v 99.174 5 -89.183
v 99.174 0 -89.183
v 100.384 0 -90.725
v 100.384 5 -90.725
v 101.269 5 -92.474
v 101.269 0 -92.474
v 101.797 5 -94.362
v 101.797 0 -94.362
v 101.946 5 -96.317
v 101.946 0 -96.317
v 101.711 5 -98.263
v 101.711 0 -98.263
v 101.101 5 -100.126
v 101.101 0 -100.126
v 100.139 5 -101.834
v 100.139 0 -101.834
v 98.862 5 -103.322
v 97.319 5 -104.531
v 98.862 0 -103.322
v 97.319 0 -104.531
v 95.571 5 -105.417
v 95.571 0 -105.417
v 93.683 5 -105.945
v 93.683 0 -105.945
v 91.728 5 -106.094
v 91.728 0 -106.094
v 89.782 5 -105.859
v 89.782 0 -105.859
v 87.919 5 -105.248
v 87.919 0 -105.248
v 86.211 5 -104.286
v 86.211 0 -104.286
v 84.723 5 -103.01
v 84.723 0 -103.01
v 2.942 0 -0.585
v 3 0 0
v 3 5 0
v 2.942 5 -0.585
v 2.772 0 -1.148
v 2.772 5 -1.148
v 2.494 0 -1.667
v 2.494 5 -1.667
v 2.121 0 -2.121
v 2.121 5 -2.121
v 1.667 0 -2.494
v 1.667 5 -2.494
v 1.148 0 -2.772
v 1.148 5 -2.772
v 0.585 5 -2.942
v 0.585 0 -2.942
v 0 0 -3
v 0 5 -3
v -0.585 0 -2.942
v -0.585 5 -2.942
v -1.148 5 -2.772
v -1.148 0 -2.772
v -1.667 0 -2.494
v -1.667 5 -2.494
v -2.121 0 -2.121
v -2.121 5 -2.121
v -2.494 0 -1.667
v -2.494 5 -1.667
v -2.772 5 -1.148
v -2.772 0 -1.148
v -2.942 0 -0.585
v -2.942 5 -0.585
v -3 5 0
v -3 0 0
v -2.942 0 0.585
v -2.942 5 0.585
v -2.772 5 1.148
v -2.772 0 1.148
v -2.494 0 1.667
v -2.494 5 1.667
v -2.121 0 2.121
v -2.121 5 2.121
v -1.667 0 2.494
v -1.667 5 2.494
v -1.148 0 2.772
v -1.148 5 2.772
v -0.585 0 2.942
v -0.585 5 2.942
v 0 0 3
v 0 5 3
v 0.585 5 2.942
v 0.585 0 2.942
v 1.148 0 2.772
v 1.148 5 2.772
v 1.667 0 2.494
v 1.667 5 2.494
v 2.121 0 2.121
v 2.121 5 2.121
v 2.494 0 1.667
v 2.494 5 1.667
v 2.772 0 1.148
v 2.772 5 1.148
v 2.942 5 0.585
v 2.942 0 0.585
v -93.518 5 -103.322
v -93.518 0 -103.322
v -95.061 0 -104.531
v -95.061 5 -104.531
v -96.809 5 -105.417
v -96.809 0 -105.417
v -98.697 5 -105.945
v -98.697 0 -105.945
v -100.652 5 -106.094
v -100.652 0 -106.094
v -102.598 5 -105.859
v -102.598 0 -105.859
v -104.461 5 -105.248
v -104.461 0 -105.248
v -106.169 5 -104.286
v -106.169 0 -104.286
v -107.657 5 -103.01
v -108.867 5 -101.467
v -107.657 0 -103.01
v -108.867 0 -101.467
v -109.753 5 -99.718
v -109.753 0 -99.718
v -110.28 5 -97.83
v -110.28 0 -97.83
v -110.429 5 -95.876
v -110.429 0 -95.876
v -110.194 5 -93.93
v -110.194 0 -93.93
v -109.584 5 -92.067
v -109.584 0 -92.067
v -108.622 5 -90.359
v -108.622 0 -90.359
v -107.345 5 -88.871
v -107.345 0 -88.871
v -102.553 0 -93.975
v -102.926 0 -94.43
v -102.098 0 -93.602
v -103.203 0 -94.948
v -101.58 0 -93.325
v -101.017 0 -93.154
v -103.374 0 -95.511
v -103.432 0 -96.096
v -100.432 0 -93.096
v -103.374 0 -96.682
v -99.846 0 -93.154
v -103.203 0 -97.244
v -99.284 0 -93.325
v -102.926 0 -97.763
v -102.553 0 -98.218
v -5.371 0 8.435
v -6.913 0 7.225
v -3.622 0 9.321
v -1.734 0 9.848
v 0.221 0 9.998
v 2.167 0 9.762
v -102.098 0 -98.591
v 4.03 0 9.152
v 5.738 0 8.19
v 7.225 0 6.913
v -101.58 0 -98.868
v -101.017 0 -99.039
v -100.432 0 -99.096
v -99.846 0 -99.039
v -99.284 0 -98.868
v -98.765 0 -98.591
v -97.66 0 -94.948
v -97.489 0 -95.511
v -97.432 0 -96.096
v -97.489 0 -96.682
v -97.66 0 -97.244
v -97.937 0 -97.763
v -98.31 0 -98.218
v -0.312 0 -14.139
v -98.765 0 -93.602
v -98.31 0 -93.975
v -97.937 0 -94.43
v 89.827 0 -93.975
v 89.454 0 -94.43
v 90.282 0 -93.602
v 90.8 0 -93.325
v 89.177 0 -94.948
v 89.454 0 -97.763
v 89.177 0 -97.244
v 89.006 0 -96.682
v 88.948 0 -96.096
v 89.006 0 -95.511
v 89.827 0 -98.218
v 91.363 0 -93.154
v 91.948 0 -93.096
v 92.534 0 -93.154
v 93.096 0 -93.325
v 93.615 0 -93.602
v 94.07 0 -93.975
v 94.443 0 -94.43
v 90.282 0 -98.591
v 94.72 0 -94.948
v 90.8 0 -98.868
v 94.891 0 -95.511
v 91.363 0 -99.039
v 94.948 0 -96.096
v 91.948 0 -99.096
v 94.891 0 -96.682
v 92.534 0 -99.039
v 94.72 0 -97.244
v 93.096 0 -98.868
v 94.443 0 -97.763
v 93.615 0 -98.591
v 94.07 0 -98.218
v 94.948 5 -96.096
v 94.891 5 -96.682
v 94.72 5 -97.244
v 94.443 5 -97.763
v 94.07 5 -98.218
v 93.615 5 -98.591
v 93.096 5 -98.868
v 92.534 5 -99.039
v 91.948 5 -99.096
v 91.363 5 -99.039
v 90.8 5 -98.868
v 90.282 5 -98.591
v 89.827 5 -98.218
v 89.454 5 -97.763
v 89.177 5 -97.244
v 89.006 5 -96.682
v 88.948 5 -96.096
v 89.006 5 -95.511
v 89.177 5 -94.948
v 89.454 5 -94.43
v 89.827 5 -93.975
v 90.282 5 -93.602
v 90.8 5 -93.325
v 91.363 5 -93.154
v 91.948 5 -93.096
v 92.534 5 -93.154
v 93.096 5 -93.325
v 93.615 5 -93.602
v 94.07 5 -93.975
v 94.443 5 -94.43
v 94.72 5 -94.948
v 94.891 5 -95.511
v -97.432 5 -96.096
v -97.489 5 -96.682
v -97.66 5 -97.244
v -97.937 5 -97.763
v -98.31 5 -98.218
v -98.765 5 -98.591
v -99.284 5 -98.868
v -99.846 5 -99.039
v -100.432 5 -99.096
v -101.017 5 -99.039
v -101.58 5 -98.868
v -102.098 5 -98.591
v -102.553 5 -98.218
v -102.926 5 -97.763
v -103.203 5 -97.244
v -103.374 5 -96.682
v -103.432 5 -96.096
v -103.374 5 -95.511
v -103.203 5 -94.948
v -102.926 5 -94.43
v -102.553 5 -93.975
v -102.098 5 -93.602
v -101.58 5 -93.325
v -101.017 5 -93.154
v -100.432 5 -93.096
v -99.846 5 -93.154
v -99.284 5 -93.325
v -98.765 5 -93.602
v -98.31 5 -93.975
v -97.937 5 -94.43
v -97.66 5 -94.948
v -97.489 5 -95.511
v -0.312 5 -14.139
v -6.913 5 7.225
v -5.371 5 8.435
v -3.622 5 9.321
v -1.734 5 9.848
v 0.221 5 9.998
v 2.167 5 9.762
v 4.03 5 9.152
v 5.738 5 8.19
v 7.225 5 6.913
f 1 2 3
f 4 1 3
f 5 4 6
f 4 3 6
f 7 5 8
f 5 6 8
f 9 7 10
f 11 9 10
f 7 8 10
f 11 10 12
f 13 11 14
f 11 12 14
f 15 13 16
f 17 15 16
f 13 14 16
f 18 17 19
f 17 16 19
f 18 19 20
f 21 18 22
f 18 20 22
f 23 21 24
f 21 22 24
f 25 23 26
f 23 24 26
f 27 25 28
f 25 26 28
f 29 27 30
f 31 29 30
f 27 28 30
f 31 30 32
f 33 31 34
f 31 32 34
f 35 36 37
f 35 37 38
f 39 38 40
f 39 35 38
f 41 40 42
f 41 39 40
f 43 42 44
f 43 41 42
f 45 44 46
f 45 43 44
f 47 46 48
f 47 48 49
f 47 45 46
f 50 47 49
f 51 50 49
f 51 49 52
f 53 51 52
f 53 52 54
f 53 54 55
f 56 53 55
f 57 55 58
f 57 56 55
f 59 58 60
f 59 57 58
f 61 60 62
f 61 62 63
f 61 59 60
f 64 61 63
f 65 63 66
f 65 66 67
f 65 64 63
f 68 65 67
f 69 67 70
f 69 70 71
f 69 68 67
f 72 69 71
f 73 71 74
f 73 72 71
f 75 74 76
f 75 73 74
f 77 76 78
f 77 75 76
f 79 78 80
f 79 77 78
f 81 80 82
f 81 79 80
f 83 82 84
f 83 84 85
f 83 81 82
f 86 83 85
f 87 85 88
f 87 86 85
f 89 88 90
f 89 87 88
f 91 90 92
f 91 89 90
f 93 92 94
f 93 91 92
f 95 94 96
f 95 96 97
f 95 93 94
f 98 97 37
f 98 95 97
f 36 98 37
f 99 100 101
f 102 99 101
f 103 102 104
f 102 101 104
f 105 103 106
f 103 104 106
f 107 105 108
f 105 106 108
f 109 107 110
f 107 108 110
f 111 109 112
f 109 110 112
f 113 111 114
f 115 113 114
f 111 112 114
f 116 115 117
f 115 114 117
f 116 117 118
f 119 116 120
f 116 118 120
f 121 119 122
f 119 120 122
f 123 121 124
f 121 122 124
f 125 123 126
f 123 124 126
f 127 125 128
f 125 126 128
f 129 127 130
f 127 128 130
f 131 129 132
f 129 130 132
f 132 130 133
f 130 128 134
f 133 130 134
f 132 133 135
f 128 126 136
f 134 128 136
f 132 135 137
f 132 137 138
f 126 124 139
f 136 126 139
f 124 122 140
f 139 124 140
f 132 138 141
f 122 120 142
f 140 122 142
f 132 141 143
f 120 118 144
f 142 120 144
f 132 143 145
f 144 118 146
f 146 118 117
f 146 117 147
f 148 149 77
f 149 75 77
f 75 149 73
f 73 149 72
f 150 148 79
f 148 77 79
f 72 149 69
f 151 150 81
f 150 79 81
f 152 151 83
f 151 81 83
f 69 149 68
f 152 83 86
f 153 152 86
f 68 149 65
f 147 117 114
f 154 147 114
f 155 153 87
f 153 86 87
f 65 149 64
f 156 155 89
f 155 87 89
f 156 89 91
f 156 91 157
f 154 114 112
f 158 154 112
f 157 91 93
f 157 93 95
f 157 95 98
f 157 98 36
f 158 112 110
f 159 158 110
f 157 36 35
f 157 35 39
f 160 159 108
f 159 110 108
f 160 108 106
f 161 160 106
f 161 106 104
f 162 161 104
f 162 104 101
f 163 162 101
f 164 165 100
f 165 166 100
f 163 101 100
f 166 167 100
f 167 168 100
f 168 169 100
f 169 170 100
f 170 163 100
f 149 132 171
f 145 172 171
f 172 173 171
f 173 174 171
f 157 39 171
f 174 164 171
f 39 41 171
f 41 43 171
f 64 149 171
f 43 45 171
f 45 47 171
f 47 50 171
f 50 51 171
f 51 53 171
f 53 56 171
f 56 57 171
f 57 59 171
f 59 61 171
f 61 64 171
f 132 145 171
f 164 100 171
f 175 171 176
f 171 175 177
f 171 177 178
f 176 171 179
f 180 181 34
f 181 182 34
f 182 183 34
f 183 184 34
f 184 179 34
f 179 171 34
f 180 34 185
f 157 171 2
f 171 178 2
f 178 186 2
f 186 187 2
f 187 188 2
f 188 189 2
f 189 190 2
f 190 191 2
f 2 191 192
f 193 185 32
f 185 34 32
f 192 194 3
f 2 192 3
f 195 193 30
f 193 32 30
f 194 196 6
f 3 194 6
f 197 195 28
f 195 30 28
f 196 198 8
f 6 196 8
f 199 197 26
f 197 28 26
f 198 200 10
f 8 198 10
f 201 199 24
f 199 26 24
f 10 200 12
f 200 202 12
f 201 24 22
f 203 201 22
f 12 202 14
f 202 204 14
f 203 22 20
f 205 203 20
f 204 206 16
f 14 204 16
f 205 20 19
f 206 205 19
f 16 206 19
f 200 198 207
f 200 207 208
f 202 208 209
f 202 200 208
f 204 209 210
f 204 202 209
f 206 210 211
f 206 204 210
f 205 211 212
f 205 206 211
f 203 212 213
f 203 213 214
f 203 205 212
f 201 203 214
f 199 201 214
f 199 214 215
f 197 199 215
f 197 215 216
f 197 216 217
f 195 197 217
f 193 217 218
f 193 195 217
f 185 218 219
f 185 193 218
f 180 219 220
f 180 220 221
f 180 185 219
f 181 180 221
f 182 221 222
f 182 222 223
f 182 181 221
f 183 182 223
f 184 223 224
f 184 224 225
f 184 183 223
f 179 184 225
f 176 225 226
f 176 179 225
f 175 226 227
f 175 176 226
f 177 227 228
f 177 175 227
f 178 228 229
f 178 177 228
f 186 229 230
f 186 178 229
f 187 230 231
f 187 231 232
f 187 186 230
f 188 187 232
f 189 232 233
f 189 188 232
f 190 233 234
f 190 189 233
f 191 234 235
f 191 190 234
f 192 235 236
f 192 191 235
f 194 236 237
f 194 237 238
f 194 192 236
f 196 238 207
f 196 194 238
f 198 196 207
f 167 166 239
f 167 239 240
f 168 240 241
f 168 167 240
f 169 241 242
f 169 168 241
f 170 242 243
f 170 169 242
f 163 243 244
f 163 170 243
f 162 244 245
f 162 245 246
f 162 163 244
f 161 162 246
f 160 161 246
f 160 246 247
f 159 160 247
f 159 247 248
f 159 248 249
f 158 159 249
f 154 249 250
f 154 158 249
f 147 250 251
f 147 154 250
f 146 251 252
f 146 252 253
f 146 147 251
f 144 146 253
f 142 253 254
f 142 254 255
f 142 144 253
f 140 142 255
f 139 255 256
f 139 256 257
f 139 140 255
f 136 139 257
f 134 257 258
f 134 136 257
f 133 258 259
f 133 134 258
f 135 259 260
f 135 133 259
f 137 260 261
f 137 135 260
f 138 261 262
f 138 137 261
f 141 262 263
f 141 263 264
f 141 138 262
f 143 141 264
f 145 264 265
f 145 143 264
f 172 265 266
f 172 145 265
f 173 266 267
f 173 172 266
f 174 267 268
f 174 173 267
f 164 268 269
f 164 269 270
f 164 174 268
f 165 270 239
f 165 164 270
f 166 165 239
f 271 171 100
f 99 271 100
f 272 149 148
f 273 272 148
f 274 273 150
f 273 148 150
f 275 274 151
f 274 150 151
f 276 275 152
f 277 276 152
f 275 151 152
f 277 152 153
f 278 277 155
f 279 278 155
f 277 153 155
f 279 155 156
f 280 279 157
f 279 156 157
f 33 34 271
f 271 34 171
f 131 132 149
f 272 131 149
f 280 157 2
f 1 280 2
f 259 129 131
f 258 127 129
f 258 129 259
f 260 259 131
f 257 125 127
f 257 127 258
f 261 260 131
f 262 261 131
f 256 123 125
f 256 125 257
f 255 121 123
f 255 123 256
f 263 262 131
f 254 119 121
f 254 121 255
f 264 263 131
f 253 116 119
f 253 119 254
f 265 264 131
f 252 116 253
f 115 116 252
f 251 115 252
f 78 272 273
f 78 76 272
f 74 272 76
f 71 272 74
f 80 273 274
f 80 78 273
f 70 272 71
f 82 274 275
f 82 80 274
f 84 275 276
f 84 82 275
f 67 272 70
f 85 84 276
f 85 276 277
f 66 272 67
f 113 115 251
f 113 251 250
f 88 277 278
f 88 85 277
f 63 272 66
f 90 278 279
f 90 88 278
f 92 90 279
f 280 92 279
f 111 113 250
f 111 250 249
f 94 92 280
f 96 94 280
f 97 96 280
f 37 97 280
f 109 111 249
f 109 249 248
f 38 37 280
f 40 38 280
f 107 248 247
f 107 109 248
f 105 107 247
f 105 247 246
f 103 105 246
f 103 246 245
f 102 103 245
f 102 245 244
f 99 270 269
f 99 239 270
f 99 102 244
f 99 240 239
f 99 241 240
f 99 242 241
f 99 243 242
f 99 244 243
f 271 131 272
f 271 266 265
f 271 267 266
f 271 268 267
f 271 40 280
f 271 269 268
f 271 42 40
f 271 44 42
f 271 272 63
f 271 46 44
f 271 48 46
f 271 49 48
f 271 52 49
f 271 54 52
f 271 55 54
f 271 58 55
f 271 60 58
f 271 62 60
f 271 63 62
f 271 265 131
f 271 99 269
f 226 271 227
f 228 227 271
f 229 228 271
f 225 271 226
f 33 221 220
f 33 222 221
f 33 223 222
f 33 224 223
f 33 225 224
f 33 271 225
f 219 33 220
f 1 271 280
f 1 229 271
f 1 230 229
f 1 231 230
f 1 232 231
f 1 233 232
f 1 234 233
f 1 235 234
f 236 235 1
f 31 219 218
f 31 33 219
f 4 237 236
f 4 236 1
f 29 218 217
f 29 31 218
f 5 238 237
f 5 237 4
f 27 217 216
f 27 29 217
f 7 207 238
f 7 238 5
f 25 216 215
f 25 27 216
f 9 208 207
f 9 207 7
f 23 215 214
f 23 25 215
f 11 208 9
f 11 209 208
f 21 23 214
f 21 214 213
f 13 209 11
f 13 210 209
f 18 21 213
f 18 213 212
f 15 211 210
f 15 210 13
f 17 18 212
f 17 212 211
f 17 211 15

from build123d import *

# Parameters (mm, degrees)
SKETCH1_R           = 3
BOSS_EXTRUDE2_DEPTH = 5


with BuildPart() as part:
    # Sketch1 → Boss-Extrude2 (new body)
    with BuildSketch(Plane(origin=(0, 0, 0), x_dir=(1, 0, 0), z_dir=(0, 1, 0))):
        with BuildLine():
            Line((-107.345005718, 88.870972468), (-6.913400561, -7.225295335))
            ThreePointArc((-6.913400561, -7.225295335), (0.220534203, -9.997567938), (7.225283293, -6.913413146))
            Line((7.225283293, -6.913413146), (99.173678137, 89.182854657))
            ThreePointArc((99.173678137, 89.182854657), (98.86180799, 103.321551097), (84.72311155, 103.009680949))
            Line((84.72311155, 103.009680949), (-0.311882189, 14.138683855))
            Line((-0.311882189, 14.138683855), (-93.518204595, 103.321563138))
            ThreePointArc((-93.518204595, 103.321563138), (-107.656900491, 103.009668365), (-107.345005718, 88.870972468))
        make_face()
        with Locations((-100.431605156, 96.096267803)):
            Circle(SKETCH1_R, mode=Mode.SUBTRACT)
        with Locations((91.948394844, 96.096267803)):
            Circle(SKETCH1_R, mode=Mode.SUBTRACT)
        Circle(SKETCH1_R, mode=Mode.SUBTRACT)
    extrude(amount=BOSS_EXTRUDE2_DEPTH)


solid = part.part
